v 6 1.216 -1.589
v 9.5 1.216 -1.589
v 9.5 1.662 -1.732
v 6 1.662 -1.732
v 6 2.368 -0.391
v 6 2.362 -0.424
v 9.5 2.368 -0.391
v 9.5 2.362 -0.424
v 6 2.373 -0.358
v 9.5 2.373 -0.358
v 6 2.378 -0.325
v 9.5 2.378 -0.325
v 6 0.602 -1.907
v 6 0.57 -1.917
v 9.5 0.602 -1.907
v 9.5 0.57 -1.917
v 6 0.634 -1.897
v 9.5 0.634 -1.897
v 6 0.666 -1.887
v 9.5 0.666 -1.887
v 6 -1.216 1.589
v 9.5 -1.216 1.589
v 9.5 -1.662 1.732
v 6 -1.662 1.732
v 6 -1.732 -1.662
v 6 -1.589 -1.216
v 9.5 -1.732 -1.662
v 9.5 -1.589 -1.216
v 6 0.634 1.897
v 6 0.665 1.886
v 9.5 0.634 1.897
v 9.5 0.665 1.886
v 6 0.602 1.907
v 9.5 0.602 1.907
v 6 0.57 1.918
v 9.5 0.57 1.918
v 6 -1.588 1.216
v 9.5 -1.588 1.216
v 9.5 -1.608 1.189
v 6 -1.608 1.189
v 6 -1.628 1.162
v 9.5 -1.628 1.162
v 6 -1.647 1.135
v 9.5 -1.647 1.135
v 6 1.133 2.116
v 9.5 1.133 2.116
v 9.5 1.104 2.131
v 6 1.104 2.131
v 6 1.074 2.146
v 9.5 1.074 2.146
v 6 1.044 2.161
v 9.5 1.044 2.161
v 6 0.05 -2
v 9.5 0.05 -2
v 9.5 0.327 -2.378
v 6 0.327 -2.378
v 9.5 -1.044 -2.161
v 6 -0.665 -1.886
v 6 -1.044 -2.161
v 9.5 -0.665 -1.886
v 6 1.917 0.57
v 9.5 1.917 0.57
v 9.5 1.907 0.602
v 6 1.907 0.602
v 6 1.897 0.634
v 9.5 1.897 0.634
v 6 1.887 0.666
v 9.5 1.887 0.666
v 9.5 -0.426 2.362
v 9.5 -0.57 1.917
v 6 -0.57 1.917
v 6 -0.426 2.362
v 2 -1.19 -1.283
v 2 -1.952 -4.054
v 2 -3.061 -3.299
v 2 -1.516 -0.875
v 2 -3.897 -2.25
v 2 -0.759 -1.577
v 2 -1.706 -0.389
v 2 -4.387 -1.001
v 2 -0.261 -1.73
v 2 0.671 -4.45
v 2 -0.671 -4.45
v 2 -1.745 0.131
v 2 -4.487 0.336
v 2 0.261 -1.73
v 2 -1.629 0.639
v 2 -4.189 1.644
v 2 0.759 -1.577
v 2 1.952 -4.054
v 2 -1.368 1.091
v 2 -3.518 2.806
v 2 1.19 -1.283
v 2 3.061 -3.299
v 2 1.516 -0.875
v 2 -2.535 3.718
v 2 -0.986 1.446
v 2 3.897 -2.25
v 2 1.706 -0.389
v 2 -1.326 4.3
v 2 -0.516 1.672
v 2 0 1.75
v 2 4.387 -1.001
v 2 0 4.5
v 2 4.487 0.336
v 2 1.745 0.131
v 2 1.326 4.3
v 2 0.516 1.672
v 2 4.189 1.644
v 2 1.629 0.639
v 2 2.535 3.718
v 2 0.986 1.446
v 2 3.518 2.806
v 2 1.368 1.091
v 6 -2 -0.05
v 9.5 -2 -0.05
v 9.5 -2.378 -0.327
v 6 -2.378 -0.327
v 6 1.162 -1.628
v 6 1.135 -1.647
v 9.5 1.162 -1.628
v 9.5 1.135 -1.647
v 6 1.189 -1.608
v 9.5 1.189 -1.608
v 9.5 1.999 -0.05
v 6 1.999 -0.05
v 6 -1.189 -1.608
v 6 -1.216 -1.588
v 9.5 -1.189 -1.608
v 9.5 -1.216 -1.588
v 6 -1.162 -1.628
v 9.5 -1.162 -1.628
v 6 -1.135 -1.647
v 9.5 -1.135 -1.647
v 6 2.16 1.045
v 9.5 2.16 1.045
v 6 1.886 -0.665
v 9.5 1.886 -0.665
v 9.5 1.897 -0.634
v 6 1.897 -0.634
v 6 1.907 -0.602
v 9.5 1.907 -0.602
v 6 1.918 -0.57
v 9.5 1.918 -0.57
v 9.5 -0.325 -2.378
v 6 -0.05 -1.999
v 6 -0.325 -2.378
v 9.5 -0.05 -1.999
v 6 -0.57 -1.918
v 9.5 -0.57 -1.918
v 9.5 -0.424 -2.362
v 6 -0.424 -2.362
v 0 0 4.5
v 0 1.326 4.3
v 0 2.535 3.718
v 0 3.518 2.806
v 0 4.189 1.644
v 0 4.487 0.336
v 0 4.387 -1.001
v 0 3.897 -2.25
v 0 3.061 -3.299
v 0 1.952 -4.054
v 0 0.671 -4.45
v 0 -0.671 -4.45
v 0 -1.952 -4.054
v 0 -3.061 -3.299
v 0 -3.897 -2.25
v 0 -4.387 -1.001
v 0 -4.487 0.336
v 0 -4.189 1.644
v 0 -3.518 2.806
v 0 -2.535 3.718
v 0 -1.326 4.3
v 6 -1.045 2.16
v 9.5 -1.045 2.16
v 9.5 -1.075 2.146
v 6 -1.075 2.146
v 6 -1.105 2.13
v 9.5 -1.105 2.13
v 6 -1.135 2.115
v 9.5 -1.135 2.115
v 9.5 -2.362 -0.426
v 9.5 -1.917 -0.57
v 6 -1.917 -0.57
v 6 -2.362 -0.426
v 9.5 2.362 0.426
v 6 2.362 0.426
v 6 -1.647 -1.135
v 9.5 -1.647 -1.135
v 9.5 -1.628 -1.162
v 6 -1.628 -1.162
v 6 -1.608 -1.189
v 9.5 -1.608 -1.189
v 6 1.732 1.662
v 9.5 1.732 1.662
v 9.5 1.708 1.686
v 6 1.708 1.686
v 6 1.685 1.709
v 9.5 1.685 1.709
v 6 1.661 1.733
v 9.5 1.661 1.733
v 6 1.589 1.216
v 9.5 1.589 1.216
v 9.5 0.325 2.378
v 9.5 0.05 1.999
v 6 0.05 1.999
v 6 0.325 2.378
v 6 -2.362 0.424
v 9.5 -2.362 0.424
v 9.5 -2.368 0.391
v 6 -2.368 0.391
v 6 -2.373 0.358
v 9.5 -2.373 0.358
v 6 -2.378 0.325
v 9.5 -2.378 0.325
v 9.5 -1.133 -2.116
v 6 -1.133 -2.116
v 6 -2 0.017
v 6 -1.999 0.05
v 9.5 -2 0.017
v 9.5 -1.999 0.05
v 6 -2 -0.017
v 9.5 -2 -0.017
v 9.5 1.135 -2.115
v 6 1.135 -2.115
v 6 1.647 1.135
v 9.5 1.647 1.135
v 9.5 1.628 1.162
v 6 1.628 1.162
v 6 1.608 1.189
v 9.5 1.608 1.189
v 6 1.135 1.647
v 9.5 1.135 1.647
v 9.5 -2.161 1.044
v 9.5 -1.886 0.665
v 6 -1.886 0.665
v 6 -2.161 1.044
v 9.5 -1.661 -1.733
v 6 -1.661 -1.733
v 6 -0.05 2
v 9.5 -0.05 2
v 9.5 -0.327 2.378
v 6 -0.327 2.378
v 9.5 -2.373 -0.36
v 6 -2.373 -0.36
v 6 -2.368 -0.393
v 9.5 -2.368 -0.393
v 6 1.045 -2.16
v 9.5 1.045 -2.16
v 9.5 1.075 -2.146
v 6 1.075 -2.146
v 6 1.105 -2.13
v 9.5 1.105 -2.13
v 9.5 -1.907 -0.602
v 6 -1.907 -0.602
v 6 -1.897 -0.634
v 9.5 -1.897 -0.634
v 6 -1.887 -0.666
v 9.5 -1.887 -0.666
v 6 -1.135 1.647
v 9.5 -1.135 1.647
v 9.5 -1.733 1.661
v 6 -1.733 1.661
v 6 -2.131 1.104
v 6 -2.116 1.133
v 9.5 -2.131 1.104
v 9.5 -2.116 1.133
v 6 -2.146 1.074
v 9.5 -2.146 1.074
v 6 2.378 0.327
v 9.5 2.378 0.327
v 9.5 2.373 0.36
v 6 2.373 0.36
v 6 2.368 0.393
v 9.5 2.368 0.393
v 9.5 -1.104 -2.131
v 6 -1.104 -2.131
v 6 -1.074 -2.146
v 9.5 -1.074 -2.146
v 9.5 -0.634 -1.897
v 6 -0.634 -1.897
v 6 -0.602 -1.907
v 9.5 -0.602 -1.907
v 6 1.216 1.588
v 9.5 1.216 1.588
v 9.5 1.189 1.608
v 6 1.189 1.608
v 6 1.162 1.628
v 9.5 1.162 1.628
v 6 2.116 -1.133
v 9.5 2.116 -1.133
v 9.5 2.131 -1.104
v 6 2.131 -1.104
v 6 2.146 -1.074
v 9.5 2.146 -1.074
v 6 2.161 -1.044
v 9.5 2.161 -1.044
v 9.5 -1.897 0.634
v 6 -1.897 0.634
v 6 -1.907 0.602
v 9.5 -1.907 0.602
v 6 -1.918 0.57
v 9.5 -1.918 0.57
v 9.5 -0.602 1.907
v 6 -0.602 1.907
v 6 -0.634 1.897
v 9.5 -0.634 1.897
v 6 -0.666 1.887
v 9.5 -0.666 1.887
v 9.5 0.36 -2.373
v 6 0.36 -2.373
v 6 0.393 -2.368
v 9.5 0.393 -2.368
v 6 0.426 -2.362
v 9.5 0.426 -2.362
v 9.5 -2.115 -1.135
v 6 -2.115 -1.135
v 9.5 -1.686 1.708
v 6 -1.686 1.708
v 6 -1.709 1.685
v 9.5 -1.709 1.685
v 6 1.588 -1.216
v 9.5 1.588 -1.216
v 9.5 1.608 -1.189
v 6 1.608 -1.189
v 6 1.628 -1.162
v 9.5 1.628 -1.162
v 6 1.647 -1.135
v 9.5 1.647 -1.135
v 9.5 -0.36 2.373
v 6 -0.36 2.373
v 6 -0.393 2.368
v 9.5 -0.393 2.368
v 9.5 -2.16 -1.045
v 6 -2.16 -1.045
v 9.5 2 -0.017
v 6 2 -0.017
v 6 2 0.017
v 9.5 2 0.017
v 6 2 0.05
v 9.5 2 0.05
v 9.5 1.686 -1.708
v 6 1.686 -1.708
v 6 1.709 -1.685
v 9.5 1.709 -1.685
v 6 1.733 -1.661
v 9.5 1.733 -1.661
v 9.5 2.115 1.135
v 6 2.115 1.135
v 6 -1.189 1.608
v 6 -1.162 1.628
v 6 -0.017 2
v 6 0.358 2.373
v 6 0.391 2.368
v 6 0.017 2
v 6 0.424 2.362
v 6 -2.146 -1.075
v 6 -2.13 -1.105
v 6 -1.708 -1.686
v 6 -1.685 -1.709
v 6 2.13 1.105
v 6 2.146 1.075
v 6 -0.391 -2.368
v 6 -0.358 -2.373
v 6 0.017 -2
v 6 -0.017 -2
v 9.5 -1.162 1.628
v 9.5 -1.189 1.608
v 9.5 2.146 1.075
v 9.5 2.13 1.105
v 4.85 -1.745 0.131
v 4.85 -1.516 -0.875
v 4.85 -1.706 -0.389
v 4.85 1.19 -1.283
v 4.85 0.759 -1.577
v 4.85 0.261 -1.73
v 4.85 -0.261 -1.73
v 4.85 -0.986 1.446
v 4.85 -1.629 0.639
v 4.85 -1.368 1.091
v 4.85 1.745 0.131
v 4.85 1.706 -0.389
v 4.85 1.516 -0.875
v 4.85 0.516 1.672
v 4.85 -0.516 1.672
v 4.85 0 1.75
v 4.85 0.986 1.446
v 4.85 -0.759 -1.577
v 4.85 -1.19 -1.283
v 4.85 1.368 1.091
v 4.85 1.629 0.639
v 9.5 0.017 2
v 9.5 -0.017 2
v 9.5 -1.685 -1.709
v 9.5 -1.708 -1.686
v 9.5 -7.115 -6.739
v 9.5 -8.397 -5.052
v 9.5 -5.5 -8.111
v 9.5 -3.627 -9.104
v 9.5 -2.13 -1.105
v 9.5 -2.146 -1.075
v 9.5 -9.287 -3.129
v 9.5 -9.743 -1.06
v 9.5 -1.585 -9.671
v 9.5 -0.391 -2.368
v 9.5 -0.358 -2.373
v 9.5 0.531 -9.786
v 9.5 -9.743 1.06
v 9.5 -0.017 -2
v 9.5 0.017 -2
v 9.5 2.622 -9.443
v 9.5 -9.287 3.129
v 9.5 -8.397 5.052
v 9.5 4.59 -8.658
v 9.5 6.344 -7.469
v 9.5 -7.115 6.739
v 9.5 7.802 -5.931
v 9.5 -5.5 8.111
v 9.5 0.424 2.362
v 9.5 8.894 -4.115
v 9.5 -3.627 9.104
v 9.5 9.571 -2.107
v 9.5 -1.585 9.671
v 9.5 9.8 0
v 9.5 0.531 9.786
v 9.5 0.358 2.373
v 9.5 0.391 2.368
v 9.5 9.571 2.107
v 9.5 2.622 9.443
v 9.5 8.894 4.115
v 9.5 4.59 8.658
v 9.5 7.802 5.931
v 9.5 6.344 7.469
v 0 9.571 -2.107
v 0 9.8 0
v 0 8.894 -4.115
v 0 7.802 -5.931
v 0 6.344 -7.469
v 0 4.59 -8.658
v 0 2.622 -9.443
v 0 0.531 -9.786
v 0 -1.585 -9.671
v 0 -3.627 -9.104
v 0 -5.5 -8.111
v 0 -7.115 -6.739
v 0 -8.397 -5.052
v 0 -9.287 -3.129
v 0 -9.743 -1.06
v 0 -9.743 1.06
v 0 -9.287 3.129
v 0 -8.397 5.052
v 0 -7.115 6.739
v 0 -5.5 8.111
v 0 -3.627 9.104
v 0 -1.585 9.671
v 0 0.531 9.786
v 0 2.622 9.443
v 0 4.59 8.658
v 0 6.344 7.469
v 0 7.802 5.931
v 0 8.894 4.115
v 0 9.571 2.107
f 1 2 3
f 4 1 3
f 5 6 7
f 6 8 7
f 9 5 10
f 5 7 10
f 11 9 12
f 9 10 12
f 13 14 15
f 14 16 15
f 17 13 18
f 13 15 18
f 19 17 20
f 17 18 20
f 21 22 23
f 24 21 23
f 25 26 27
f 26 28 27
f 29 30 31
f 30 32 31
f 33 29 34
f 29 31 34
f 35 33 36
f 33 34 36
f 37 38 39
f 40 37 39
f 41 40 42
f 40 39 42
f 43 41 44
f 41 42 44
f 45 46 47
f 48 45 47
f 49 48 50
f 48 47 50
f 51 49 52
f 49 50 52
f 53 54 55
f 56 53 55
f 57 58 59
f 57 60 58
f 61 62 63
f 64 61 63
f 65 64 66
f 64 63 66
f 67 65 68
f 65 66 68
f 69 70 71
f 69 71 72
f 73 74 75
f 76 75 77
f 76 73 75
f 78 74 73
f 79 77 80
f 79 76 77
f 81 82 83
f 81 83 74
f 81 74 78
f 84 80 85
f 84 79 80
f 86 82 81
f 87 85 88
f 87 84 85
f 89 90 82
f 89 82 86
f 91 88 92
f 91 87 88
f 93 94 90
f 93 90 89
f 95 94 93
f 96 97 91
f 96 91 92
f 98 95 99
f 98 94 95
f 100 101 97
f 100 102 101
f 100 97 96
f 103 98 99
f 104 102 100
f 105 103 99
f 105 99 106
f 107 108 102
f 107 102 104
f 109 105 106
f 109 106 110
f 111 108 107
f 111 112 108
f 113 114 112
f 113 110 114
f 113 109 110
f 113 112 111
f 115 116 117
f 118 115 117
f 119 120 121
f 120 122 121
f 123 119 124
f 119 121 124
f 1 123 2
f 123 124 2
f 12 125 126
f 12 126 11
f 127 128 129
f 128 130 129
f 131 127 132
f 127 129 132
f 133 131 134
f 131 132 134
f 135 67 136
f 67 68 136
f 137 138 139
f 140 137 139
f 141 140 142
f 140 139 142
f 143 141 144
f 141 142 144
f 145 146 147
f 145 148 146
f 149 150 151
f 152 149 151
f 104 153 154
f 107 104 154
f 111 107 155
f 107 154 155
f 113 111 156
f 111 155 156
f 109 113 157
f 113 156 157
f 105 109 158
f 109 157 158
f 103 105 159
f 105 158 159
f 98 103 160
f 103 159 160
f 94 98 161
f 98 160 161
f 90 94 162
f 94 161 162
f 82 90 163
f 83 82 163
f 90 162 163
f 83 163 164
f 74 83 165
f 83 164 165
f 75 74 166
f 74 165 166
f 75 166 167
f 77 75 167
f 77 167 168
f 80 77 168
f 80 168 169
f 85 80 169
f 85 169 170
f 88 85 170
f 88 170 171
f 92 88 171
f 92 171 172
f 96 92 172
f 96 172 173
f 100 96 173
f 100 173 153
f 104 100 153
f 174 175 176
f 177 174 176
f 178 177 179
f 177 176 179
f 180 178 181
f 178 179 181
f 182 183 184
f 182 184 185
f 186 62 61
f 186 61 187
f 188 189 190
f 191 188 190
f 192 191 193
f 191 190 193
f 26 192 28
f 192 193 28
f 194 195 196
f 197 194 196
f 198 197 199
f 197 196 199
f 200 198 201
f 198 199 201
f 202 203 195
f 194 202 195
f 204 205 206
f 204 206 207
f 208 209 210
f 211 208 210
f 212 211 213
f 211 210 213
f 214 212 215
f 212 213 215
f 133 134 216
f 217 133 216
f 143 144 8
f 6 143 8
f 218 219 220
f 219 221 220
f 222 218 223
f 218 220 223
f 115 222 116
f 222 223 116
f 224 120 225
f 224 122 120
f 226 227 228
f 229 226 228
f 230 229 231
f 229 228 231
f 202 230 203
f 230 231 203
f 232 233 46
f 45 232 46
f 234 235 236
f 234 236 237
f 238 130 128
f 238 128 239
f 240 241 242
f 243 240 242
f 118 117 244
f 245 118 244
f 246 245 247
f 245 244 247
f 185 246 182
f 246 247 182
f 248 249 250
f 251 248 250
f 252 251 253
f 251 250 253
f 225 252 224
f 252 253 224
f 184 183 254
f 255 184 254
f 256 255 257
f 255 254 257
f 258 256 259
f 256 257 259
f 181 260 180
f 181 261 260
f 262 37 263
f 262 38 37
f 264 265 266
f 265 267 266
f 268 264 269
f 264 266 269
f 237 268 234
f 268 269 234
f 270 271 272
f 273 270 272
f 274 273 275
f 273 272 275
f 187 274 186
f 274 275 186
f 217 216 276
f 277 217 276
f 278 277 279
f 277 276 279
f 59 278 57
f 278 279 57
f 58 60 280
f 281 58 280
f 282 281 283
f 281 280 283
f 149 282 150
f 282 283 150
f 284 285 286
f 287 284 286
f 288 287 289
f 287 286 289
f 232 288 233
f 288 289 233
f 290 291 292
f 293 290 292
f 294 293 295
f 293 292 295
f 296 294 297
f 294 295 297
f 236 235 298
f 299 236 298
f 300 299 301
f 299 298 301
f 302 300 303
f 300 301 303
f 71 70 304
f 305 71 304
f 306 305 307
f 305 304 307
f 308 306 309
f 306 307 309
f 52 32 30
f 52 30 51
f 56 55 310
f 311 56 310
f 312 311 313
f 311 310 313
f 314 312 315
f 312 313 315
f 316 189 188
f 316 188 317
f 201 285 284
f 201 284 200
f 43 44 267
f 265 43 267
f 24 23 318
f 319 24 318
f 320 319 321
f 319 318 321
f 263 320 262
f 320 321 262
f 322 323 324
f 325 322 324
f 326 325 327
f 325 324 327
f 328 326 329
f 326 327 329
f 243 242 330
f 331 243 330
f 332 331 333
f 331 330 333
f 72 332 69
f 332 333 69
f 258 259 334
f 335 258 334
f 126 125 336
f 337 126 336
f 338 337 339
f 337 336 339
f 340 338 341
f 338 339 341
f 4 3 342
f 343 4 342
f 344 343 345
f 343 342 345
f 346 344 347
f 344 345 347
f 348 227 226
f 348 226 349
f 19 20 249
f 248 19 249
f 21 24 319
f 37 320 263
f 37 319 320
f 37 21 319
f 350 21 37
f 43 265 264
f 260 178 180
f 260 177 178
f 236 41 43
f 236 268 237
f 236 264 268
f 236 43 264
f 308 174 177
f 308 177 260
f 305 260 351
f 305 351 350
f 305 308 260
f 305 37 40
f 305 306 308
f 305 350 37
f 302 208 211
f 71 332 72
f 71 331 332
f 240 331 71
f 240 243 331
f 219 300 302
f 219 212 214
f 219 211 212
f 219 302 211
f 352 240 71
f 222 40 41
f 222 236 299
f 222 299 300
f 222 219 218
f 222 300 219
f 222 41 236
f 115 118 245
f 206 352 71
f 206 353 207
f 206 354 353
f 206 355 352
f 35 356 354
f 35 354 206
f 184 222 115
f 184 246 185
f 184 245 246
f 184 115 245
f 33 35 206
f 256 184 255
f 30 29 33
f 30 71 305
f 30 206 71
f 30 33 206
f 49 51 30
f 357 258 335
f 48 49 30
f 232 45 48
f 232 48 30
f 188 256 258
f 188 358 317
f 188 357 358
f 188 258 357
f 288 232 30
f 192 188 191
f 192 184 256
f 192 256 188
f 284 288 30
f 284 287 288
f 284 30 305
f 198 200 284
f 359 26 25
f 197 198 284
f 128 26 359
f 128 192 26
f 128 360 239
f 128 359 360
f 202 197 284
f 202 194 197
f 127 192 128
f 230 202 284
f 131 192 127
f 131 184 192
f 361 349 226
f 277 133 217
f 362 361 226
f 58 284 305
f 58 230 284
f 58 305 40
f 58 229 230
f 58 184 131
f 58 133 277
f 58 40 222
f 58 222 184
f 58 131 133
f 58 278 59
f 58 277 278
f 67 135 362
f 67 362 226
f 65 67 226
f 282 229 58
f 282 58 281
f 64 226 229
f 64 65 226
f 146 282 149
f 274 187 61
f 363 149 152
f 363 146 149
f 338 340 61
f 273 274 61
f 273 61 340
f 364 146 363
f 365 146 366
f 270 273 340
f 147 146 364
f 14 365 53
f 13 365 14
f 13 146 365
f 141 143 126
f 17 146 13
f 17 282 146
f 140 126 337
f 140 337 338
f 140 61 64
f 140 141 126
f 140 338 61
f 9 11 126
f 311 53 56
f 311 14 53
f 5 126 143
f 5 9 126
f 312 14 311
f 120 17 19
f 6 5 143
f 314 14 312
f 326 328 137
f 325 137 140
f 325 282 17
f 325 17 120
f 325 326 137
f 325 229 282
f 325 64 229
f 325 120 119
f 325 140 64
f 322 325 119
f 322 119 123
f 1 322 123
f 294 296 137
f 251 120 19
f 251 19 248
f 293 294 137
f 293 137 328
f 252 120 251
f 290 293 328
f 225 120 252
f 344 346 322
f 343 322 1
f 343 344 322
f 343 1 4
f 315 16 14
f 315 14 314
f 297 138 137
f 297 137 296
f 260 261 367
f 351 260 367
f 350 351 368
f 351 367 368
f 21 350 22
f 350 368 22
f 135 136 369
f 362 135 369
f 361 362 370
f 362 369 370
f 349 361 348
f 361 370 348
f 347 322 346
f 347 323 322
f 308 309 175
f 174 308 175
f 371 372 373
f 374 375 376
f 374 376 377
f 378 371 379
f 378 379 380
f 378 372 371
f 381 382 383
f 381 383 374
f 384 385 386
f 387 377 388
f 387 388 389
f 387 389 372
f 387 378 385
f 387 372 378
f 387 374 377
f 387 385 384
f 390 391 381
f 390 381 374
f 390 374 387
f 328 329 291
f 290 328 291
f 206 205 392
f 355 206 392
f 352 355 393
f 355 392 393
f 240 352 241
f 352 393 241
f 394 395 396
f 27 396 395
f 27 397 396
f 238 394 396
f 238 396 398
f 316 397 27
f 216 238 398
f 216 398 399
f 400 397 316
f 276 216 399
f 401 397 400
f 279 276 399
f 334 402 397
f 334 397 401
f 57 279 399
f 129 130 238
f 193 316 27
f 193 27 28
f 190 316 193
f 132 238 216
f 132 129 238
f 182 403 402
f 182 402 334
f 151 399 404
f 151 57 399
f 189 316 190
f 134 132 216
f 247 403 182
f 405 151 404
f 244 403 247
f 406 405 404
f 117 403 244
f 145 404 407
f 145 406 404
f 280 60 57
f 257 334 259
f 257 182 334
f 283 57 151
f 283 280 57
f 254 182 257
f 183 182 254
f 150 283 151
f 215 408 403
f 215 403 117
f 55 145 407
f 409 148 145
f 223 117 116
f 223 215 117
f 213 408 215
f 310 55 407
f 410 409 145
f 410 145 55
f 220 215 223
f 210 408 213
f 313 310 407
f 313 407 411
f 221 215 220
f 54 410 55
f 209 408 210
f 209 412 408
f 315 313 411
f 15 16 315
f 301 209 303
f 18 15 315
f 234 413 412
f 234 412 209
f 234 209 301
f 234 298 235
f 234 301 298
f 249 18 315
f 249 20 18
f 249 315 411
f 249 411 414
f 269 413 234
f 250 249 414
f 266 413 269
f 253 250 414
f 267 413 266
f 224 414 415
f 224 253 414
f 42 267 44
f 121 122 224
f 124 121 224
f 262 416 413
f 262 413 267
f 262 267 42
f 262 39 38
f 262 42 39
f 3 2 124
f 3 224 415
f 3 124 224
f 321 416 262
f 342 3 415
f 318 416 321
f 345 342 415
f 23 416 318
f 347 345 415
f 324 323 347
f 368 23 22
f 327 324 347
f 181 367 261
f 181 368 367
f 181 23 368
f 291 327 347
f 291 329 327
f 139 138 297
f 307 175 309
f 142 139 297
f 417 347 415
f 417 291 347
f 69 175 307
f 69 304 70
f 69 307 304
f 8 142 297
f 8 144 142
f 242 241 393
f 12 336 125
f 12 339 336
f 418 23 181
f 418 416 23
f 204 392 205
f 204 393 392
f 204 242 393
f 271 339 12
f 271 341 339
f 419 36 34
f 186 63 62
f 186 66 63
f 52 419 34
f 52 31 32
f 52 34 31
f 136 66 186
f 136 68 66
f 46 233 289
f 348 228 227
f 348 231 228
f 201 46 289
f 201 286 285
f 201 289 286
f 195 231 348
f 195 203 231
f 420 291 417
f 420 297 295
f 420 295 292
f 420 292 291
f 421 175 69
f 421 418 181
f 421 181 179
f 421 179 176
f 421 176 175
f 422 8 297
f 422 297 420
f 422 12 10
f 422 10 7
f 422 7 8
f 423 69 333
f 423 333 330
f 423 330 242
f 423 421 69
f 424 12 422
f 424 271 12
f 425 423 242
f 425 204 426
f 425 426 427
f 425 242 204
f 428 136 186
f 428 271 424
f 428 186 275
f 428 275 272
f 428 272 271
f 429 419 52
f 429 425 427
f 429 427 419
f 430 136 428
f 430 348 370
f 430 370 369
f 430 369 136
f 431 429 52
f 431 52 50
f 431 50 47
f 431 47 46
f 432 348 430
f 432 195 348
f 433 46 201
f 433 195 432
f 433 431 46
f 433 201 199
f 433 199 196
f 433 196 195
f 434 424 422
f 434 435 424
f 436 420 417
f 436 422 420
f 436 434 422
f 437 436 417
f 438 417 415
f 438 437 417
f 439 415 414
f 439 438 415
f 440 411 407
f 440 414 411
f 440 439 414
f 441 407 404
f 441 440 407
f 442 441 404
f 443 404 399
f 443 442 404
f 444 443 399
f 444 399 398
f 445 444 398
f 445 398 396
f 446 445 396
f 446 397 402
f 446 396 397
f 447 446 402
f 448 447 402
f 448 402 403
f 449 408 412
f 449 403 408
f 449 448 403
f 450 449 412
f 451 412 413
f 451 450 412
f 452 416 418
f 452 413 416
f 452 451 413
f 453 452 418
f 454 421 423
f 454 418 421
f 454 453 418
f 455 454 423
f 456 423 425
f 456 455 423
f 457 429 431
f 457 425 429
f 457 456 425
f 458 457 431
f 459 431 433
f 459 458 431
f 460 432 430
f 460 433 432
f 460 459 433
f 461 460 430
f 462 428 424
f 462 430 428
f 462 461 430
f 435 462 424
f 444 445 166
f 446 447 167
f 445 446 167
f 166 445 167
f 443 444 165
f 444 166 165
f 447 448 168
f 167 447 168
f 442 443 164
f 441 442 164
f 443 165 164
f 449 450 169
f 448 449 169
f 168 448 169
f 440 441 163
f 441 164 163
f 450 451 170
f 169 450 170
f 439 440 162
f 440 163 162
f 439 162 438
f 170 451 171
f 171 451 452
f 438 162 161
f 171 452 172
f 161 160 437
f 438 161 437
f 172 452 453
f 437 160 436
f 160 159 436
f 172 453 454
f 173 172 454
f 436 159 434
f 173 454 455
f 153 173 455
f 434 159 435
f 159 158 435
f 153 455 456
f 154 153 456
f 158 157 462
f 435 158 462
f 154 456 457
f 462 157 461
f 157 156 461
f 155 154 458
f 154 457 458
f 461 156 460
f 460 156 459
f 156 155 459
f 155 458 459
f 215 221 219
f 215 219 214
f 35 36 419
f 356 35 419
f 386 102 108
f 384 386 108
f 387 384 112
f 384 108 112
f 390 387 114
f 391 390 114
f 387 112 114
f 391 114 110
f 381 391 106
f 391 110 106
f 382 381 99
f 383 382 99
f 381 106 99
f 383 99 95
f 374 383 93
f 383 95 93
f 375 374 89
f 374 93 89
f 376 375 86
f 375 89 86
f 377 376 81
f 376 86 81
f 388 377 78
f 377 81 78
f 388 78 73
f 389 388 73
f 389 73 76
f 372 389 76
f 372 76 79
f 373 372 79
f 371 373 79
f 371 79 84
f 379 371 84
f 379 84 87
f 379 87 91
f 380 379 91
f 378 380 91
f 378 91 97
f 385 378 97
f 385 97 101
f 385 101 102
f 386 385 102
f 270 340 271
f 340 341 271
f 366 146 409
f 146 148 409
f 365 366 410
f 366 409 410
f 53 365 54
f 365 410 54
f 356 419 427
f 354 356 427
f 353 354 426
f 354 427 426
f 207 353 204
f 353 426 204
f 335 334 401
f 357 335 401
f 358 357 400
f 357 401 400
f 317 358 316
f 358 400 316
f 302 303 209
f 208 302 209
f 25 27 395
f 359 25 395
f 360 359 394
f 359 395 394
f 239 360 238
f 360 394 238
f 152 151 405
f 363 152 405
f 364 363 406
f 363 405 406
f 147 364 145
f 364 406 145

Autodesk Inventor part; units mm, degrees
ref_plane "YZ Plane" through (0, 0, 0) normal (1, 0, 0) x (0, 1, 0)
ref_plane "XZ Plane" through (0, 0, 0) normal (0, 1, 0) x (-1, 0, 0)
ref_plane "XY Plane" through (0, 0, 0) normal (0, 0, 1) x (1, 0, 0)
sketch "Esboço2" plane through (0, 0, 0) normal (0, 0, 1) x (1, 0, 0)
  line L0 (0, 0) -> (9.5, 0)
  line L1 (9.5, 0) -> (9.5, 9.8)
  line L2 (9.5, 9.8) -> (0, 9.8)
  line L3 (0, 9.8) -> (0, 0)
  dimension "d0" = 9.5
  dimension "d1" = 9.8
revolve "Revolução1" add sketch "Esboço2" angle 360 about axis through (0, 0, 0) along (1, 0, 0)
sketch "Esboço3" plane through (0, 0, 0) normal (-1, 0, 0) x (0, 0, 1)
  circle A0 centre (0, 0) radius 1.75
  dimension "d3" = 3.5
extrude "Extrusão1" cut sketch "Esboço3" against normal blind 4.85
sketch "Esboço4" plane through (0, 0, 0) normal (-1, 0, 0) x (0, 0, 1)
  circle A0 centre (0, 0) radius 4.5
  dimension "d6" = 9
extrude "Extrusão2" cut sketch "Esboço4" against normal blind 2
sketch "Esboço8" plane through (9.5, 0, 0) normal (1, 0, 0) x (0, 0, -1)
  circle A0 centre (0, 0) radius 2
  circle A1 centre (0, 0) radius 2.4
  line L0 (2, 0) -> (2, 0.05)
  line L1 (2, 0) -> (1.9994, -0.05)
  line L2 (1.9994, -0.05) -> (2, 0.05)
  line L3 (2, 0.05) -> (2.3777, 0.3266)
  line L4 (1.9994, -0.05) -> (2.3779, -0.3252)
  arc A2 (2.3779, -0.3252) -> (2.3777, 0.3266) centre (0, 0) ccw
  line L5 (2.3777, 0.3266) -> (2.3777, 0.3266)
  line L6 (2.3777, 0.3266) -> (2.3777, 0.3266)
  line L7 (2.3777, 0.3266) -> (2.3777, 0.3266)
  line L8 (2.3779, -0.3252) -> (2.3706, -0.3747)
  line L9 (2.3706, -0.3747) -> (2.3779, -0.3252)
  line L10 (2.3777, 0.3266) -> (2.3777, 0.3266)
  line L11 (2.3777, 0.3266) -> (2.3777, 0.3266)
  line L12 (1.8867, 0.6656) -> (2.1604, 1.0453)
  line L13 (1.917, 0.5703) -> (1.8867, 0.6656)
  line L14 (1.917, 0.5703) -> (2.362, 0.4255)
  line L15 (2.3703, 0.3762) -> (2.362, 0.4255)
  arc A3 (2.362, 0.4255) -> (2.1604, 1.0453) centre (0, 0) ccw
  line L16 (1.5886, 1.216) -> (1.7316, 1.6618)
  line L17 (1.6469, 1.1348) -> (1.5886, 1.216)
  line L18 (1.6469, 1.1348) -> (2.1149, 1.1346)
  line L19 (2.1381, 1.0903) -> (2.1149, 1.1346)
  arc A4 (2.1149, 1.1346) -> (1.7316, 1.6618) centre (0, 0) ccw
  line L20 (1.1351, 1.6474) -> (1.1334, 2.1155)
  line L21 (1.2157, 1.5881) -> (1.1351, 1.6474)
  line L22 (1.2157, 1.5881) -> (1.6608, 1.7326)
  line L23 (1.6965, 1.6976) -> (1.6608, 1.7326)
  arc A5 (1.6608, 1.7326) -> (1.1334, 2.1155) centre (0, 0) ccw
  line L24 (0.5705, 1.9176) -> (0.4241, 2.3622)
  line L25 (0.6654, 1.8861) -> (0.5705, 1.9176)
  line L26 (0.6654, 1.8861) -> (1.0441, 2.161)
  line L27 (1.0889, 2.1388) -> (1.0441, 2.161)
  arc A6 (1.0441, 2.161) -> (0.4241, 2.3622) centre (0, 0) ccw
  line L28 (-0.05, 2) -> (-0.3266, 2.3777)
  line L29 (0.05, 1.9994) -> (-0.05, 2)
  line L30 (0.05, 1.9994) -> (0.3252, 2.3779)
  line L31 (0.3747, 2.3706) -> (0.3252, 2.3779)
  arc A7 (0.3252, 2.3779) -> (-0.3266, 2.3777) centre (0, 0) ccw
  line L32 (-0.6656, 1.8867) -> (-1.0453, 2.1604)
  line L33 (-0.5703, 1.917) -> (-0.6656, 1.8867)
  line L34 (-0.5703, 1.917) -> (-0.4255, 2.362)
  line L35 (-0.3762, 2.3703) -> (-0.4255, 2.362)
  arc A8 (-0.4255, 2.362) -> (-1.0453, 2.1604) centre (0, 0) ccw
  line L36 (-1.216, 1.5886) -> (-1.6618, 1.7316)
  line L37 (-1.1348, 1.6469) -> (-1.216, 1.5886)
  line L38 (-1.1348, 1.6469) -> (-1.1346, 2.1149)
  line L39 (-1.0903, 2.1381) -> (-1.1346, 2.1149)
  arc A9 (-1.1346, 2.1149) -> (-1.6618, 1.7316) centre (0, 0) ccw
  line L40 (-1.6474, 1.1351) -> (-2.1155, 1.1334)
  line L41 (-1.5881, 1.2157) -> (-1.6474, 1.1351)
  line L42 (-1.5881, 1.2157) -> (-1.7326, 1.6608)
  line L43 (-1.6976, 1.6965) -> (-1.7326, 1.6608)
  arc A10 (-1.7326, 1.6608) -> (-2.1155, 1.1334) centre (0, 0) ccw
  line L44 (-1.9176, 0.5705) -> (-2.3622, 0.4241)
  line L45 (-1.8861, 0.6654) -> (-1.9176, 0.5705)
  line L46 (-1.8861, 0.6654) -> (-2.161, 1.0441)
  line L47 (-2.1388, 1.0889) -> (-2.161, 1.0441)
  arc A11 (-2.161, 1.0441) -> (-2.3622, 0.4241) centre (0, 0) ccw
  line L48 (-2, -0.05) -> (-2.3777, -0.3266)
  line L49 (-1.9994, 0.05) -> (-2, -0.05)
  line L50 (-1.9994, 0.05) -> (-2.3779, 0.3252)
  line L51 (-2.3706, 0.3747) -> (-2.3779, 0.3252)
  arc A12 (-2.3779, 0.3252) -> (-2.3777, -0.3266) centre (0, 0) ccw
  line L52 (-1.8867, -0.6656) -> (-2.1604, -1.0453)
  line L53 (-1.917, -0.5703) -> (-1.8867, -0.6656)
  line L54 (-1.917, -0.5703) -> (-2.362, -0.4255)
  line L55 (-2.3703, -0.3762) -> (-2.362, -0.4255)
  arc A13 (-2.362, -0.4255) -> (-2.1604, -1.0453) centre (0, 0) ccw
  line L56 (-1.5886, -1.216) -> (-1.7316, -1.6618)
  line L57 (-1.6469, -1.1348) -> (-1.5886, -1.216)
  line L58 (-1.6469, -1.1348) -> (-2.1149, -1.1346)
  line L59 (-2.1381, -1.0903) -> (-2.1149, -1.1346)
  arc A14 (-2.1149, -1.1346) -> (-1.7316, -1.6618) centre (0, 0) ccw
  line L60 (-1.1351, -1.6474) -> (-1.1334, -2.1155)
  line L61 (-1.2157, -1.5881) -> (-1.1351, -1.6474)
  line L62 (-1.2157, -1.5881) -> (-1.6608, -1.7326)
  line L63 (-1.6965, -1.6976) -> (-1.6608, -1.7326)
  arc A15 (-1.6608, -1.7326) -> (-1.1334, -2.1155) centre (0, 0) ccw
  line L64 (-0.5705, -1.9176) -> (-0.4241, -2.3622)
  line L65 (-0.6654, -1.8861) -> (-0.5705, -1.9176)
  line L66 (-0.6654, -1.8861) -> (-1.0441, -2.161)
  line L67 (-1.0889, -2.1388) -> (-1.0441, -2.161)
  arc A16 (-1.0441, -2.161) -> (-0.4241, -2.3622) centre (0, 0) ccw
  line L68 (0.05, -2) -> (0.3266, -2.3777)
  line L69 (-0.05, -1.9994) -> (0.05, -2)
  line L70 (-0.05, -1.9994) -> (-0.3252, -2.3779)
  line L71 (-0.3747, -2.3706) -> (-0.3252, -2.3779)
  arc A17 (-0.3252, -2.3779) -> (0.3266, -2.3777) centre (0, 0) ccw
  line L72 (0.6656, -1.8867) -> (1.0453, -2.1604)
  line L73 (0.5703, -1.917) -> (0.6656, -1.8867)
  line L74 (0.5703, -1.917) -> (0.4255, -2.362)
  line L75 (0.3762, -2.3703) -> (0.4255, -2.362)
  arc A18 (0.4255, -2.362) -> (1.0453, -2.1604) centre (0, 0) ccw
  line L76 (1.216, -1.5886) -> (1.6618, -1.7316)
  line L77 (1.1348, -1.6469) -> (1.216, -1.5886)
  line L78 (1.1348, -1.6469) -> (1.1346, -2.1149)
  line L79 (1.0903, -2.1381) -> (1.1346, -2.1149)
  arc A19 (1.1346, -2.1149) -> (1.6618, -1.7316) centre (0, 0) ccw
  line L80 (1.6474, -1.1351) -> (2.1155, -1.1334)
  line L81 (1.5881, -1.2157) -> (1.6474, -1.1351)
  line L82 (1.5881, -1.2157) -> (1.7326, -1.6608)
  line L83 (1.6976, -1.6965) -> (1.7326, -1.6608)
  arc A20 (1.7326, -1.6608) -> (2.1155, -1.1334) centre (0, 0) ccw
  line L84 (1.9176, -0.5705) -> (2.3622, -0.4241)
  line L85 (1.8861, -0.6654) -> (1.9176, -0.5705)
  line L86 (1.8861, -0.6654) -> (2.161, -1.0441)
  line L87 (2.1388, -1.0889) -> (2.161, -1.0441)
  arc A21 (2.161, -1.0441) -> (2.3622, -0.4241) centre (0, 0) ccw
  point P0 (1.9998, 0.025)
  point P1 (1.8942, 0.6418)
  point P2 (1.6032, 1.1957)
  point P3 (1.1553, 1.6326)
  point P4 (0.5942, 1.9097)
  point P5 (-0.025, 1.9998)
  point P6 (-0.6418, 1.8942)
  point P7 (-1.1957, 1.6032)
  point P8 (-1.6326, 1.1553)
  point P9 (-1.9097, 0.5942)
  point P10 (-1.9998, -0.025)
  point P11 (-1.8942, -0.6418)
  point P12 (-1.6032, -1.1957)
  point P13 (-1.1553, -1.6326)
  point P14 (-0.5942, -1.9097)
  point P15 (0.025, -1.9998)
  point P16 (0.6418, -1.8942)
  point P17 (1.1957, -1.6032)
  point P18 (1.6326, -1.1553)
  point P19 (1.9097, -0.5942)
  dimension "d35" = 4
  dimension "d36" = 4.8
  dimension "d37" = 0.05
  dimension "d38" = 0.05
  dimension "d39" = 0.05
  dimension "d44" = 360
extrude "Extrusão3" cut sketch "Esboço8" against normal blind 3.5 contours A0 | A0 L14 A1 L3 | L4 A1 L84 A0 | A0 L18 A1 L12 | L86 A1 L80 A0 | A0 L22 A1 L16 | L82 A1 L76 A0 | A0 L26 A1 L20 | L78 A1 L72 A0 | A0 L30 A1 L24 | L74 A1 L68 A0 | A0 L34 A1 L28 | L70 A1 L64 A0 | A0 L38 A1 L32 | L66 A1 L60 A0 | A0 L42 A1 L36 | L62 A1 L56 A0 | A0 L46 A1 L40 | L58 A1 L52 A0 | A0 L50 A1 L44 | L54 A1 L48 A0
sketch "Esboço9" plane through (9.5, 0, 0) normal (1, 0, 0) x (0, 0, -1)
  point P0 (0, 0)
properties part number "roda certa"
